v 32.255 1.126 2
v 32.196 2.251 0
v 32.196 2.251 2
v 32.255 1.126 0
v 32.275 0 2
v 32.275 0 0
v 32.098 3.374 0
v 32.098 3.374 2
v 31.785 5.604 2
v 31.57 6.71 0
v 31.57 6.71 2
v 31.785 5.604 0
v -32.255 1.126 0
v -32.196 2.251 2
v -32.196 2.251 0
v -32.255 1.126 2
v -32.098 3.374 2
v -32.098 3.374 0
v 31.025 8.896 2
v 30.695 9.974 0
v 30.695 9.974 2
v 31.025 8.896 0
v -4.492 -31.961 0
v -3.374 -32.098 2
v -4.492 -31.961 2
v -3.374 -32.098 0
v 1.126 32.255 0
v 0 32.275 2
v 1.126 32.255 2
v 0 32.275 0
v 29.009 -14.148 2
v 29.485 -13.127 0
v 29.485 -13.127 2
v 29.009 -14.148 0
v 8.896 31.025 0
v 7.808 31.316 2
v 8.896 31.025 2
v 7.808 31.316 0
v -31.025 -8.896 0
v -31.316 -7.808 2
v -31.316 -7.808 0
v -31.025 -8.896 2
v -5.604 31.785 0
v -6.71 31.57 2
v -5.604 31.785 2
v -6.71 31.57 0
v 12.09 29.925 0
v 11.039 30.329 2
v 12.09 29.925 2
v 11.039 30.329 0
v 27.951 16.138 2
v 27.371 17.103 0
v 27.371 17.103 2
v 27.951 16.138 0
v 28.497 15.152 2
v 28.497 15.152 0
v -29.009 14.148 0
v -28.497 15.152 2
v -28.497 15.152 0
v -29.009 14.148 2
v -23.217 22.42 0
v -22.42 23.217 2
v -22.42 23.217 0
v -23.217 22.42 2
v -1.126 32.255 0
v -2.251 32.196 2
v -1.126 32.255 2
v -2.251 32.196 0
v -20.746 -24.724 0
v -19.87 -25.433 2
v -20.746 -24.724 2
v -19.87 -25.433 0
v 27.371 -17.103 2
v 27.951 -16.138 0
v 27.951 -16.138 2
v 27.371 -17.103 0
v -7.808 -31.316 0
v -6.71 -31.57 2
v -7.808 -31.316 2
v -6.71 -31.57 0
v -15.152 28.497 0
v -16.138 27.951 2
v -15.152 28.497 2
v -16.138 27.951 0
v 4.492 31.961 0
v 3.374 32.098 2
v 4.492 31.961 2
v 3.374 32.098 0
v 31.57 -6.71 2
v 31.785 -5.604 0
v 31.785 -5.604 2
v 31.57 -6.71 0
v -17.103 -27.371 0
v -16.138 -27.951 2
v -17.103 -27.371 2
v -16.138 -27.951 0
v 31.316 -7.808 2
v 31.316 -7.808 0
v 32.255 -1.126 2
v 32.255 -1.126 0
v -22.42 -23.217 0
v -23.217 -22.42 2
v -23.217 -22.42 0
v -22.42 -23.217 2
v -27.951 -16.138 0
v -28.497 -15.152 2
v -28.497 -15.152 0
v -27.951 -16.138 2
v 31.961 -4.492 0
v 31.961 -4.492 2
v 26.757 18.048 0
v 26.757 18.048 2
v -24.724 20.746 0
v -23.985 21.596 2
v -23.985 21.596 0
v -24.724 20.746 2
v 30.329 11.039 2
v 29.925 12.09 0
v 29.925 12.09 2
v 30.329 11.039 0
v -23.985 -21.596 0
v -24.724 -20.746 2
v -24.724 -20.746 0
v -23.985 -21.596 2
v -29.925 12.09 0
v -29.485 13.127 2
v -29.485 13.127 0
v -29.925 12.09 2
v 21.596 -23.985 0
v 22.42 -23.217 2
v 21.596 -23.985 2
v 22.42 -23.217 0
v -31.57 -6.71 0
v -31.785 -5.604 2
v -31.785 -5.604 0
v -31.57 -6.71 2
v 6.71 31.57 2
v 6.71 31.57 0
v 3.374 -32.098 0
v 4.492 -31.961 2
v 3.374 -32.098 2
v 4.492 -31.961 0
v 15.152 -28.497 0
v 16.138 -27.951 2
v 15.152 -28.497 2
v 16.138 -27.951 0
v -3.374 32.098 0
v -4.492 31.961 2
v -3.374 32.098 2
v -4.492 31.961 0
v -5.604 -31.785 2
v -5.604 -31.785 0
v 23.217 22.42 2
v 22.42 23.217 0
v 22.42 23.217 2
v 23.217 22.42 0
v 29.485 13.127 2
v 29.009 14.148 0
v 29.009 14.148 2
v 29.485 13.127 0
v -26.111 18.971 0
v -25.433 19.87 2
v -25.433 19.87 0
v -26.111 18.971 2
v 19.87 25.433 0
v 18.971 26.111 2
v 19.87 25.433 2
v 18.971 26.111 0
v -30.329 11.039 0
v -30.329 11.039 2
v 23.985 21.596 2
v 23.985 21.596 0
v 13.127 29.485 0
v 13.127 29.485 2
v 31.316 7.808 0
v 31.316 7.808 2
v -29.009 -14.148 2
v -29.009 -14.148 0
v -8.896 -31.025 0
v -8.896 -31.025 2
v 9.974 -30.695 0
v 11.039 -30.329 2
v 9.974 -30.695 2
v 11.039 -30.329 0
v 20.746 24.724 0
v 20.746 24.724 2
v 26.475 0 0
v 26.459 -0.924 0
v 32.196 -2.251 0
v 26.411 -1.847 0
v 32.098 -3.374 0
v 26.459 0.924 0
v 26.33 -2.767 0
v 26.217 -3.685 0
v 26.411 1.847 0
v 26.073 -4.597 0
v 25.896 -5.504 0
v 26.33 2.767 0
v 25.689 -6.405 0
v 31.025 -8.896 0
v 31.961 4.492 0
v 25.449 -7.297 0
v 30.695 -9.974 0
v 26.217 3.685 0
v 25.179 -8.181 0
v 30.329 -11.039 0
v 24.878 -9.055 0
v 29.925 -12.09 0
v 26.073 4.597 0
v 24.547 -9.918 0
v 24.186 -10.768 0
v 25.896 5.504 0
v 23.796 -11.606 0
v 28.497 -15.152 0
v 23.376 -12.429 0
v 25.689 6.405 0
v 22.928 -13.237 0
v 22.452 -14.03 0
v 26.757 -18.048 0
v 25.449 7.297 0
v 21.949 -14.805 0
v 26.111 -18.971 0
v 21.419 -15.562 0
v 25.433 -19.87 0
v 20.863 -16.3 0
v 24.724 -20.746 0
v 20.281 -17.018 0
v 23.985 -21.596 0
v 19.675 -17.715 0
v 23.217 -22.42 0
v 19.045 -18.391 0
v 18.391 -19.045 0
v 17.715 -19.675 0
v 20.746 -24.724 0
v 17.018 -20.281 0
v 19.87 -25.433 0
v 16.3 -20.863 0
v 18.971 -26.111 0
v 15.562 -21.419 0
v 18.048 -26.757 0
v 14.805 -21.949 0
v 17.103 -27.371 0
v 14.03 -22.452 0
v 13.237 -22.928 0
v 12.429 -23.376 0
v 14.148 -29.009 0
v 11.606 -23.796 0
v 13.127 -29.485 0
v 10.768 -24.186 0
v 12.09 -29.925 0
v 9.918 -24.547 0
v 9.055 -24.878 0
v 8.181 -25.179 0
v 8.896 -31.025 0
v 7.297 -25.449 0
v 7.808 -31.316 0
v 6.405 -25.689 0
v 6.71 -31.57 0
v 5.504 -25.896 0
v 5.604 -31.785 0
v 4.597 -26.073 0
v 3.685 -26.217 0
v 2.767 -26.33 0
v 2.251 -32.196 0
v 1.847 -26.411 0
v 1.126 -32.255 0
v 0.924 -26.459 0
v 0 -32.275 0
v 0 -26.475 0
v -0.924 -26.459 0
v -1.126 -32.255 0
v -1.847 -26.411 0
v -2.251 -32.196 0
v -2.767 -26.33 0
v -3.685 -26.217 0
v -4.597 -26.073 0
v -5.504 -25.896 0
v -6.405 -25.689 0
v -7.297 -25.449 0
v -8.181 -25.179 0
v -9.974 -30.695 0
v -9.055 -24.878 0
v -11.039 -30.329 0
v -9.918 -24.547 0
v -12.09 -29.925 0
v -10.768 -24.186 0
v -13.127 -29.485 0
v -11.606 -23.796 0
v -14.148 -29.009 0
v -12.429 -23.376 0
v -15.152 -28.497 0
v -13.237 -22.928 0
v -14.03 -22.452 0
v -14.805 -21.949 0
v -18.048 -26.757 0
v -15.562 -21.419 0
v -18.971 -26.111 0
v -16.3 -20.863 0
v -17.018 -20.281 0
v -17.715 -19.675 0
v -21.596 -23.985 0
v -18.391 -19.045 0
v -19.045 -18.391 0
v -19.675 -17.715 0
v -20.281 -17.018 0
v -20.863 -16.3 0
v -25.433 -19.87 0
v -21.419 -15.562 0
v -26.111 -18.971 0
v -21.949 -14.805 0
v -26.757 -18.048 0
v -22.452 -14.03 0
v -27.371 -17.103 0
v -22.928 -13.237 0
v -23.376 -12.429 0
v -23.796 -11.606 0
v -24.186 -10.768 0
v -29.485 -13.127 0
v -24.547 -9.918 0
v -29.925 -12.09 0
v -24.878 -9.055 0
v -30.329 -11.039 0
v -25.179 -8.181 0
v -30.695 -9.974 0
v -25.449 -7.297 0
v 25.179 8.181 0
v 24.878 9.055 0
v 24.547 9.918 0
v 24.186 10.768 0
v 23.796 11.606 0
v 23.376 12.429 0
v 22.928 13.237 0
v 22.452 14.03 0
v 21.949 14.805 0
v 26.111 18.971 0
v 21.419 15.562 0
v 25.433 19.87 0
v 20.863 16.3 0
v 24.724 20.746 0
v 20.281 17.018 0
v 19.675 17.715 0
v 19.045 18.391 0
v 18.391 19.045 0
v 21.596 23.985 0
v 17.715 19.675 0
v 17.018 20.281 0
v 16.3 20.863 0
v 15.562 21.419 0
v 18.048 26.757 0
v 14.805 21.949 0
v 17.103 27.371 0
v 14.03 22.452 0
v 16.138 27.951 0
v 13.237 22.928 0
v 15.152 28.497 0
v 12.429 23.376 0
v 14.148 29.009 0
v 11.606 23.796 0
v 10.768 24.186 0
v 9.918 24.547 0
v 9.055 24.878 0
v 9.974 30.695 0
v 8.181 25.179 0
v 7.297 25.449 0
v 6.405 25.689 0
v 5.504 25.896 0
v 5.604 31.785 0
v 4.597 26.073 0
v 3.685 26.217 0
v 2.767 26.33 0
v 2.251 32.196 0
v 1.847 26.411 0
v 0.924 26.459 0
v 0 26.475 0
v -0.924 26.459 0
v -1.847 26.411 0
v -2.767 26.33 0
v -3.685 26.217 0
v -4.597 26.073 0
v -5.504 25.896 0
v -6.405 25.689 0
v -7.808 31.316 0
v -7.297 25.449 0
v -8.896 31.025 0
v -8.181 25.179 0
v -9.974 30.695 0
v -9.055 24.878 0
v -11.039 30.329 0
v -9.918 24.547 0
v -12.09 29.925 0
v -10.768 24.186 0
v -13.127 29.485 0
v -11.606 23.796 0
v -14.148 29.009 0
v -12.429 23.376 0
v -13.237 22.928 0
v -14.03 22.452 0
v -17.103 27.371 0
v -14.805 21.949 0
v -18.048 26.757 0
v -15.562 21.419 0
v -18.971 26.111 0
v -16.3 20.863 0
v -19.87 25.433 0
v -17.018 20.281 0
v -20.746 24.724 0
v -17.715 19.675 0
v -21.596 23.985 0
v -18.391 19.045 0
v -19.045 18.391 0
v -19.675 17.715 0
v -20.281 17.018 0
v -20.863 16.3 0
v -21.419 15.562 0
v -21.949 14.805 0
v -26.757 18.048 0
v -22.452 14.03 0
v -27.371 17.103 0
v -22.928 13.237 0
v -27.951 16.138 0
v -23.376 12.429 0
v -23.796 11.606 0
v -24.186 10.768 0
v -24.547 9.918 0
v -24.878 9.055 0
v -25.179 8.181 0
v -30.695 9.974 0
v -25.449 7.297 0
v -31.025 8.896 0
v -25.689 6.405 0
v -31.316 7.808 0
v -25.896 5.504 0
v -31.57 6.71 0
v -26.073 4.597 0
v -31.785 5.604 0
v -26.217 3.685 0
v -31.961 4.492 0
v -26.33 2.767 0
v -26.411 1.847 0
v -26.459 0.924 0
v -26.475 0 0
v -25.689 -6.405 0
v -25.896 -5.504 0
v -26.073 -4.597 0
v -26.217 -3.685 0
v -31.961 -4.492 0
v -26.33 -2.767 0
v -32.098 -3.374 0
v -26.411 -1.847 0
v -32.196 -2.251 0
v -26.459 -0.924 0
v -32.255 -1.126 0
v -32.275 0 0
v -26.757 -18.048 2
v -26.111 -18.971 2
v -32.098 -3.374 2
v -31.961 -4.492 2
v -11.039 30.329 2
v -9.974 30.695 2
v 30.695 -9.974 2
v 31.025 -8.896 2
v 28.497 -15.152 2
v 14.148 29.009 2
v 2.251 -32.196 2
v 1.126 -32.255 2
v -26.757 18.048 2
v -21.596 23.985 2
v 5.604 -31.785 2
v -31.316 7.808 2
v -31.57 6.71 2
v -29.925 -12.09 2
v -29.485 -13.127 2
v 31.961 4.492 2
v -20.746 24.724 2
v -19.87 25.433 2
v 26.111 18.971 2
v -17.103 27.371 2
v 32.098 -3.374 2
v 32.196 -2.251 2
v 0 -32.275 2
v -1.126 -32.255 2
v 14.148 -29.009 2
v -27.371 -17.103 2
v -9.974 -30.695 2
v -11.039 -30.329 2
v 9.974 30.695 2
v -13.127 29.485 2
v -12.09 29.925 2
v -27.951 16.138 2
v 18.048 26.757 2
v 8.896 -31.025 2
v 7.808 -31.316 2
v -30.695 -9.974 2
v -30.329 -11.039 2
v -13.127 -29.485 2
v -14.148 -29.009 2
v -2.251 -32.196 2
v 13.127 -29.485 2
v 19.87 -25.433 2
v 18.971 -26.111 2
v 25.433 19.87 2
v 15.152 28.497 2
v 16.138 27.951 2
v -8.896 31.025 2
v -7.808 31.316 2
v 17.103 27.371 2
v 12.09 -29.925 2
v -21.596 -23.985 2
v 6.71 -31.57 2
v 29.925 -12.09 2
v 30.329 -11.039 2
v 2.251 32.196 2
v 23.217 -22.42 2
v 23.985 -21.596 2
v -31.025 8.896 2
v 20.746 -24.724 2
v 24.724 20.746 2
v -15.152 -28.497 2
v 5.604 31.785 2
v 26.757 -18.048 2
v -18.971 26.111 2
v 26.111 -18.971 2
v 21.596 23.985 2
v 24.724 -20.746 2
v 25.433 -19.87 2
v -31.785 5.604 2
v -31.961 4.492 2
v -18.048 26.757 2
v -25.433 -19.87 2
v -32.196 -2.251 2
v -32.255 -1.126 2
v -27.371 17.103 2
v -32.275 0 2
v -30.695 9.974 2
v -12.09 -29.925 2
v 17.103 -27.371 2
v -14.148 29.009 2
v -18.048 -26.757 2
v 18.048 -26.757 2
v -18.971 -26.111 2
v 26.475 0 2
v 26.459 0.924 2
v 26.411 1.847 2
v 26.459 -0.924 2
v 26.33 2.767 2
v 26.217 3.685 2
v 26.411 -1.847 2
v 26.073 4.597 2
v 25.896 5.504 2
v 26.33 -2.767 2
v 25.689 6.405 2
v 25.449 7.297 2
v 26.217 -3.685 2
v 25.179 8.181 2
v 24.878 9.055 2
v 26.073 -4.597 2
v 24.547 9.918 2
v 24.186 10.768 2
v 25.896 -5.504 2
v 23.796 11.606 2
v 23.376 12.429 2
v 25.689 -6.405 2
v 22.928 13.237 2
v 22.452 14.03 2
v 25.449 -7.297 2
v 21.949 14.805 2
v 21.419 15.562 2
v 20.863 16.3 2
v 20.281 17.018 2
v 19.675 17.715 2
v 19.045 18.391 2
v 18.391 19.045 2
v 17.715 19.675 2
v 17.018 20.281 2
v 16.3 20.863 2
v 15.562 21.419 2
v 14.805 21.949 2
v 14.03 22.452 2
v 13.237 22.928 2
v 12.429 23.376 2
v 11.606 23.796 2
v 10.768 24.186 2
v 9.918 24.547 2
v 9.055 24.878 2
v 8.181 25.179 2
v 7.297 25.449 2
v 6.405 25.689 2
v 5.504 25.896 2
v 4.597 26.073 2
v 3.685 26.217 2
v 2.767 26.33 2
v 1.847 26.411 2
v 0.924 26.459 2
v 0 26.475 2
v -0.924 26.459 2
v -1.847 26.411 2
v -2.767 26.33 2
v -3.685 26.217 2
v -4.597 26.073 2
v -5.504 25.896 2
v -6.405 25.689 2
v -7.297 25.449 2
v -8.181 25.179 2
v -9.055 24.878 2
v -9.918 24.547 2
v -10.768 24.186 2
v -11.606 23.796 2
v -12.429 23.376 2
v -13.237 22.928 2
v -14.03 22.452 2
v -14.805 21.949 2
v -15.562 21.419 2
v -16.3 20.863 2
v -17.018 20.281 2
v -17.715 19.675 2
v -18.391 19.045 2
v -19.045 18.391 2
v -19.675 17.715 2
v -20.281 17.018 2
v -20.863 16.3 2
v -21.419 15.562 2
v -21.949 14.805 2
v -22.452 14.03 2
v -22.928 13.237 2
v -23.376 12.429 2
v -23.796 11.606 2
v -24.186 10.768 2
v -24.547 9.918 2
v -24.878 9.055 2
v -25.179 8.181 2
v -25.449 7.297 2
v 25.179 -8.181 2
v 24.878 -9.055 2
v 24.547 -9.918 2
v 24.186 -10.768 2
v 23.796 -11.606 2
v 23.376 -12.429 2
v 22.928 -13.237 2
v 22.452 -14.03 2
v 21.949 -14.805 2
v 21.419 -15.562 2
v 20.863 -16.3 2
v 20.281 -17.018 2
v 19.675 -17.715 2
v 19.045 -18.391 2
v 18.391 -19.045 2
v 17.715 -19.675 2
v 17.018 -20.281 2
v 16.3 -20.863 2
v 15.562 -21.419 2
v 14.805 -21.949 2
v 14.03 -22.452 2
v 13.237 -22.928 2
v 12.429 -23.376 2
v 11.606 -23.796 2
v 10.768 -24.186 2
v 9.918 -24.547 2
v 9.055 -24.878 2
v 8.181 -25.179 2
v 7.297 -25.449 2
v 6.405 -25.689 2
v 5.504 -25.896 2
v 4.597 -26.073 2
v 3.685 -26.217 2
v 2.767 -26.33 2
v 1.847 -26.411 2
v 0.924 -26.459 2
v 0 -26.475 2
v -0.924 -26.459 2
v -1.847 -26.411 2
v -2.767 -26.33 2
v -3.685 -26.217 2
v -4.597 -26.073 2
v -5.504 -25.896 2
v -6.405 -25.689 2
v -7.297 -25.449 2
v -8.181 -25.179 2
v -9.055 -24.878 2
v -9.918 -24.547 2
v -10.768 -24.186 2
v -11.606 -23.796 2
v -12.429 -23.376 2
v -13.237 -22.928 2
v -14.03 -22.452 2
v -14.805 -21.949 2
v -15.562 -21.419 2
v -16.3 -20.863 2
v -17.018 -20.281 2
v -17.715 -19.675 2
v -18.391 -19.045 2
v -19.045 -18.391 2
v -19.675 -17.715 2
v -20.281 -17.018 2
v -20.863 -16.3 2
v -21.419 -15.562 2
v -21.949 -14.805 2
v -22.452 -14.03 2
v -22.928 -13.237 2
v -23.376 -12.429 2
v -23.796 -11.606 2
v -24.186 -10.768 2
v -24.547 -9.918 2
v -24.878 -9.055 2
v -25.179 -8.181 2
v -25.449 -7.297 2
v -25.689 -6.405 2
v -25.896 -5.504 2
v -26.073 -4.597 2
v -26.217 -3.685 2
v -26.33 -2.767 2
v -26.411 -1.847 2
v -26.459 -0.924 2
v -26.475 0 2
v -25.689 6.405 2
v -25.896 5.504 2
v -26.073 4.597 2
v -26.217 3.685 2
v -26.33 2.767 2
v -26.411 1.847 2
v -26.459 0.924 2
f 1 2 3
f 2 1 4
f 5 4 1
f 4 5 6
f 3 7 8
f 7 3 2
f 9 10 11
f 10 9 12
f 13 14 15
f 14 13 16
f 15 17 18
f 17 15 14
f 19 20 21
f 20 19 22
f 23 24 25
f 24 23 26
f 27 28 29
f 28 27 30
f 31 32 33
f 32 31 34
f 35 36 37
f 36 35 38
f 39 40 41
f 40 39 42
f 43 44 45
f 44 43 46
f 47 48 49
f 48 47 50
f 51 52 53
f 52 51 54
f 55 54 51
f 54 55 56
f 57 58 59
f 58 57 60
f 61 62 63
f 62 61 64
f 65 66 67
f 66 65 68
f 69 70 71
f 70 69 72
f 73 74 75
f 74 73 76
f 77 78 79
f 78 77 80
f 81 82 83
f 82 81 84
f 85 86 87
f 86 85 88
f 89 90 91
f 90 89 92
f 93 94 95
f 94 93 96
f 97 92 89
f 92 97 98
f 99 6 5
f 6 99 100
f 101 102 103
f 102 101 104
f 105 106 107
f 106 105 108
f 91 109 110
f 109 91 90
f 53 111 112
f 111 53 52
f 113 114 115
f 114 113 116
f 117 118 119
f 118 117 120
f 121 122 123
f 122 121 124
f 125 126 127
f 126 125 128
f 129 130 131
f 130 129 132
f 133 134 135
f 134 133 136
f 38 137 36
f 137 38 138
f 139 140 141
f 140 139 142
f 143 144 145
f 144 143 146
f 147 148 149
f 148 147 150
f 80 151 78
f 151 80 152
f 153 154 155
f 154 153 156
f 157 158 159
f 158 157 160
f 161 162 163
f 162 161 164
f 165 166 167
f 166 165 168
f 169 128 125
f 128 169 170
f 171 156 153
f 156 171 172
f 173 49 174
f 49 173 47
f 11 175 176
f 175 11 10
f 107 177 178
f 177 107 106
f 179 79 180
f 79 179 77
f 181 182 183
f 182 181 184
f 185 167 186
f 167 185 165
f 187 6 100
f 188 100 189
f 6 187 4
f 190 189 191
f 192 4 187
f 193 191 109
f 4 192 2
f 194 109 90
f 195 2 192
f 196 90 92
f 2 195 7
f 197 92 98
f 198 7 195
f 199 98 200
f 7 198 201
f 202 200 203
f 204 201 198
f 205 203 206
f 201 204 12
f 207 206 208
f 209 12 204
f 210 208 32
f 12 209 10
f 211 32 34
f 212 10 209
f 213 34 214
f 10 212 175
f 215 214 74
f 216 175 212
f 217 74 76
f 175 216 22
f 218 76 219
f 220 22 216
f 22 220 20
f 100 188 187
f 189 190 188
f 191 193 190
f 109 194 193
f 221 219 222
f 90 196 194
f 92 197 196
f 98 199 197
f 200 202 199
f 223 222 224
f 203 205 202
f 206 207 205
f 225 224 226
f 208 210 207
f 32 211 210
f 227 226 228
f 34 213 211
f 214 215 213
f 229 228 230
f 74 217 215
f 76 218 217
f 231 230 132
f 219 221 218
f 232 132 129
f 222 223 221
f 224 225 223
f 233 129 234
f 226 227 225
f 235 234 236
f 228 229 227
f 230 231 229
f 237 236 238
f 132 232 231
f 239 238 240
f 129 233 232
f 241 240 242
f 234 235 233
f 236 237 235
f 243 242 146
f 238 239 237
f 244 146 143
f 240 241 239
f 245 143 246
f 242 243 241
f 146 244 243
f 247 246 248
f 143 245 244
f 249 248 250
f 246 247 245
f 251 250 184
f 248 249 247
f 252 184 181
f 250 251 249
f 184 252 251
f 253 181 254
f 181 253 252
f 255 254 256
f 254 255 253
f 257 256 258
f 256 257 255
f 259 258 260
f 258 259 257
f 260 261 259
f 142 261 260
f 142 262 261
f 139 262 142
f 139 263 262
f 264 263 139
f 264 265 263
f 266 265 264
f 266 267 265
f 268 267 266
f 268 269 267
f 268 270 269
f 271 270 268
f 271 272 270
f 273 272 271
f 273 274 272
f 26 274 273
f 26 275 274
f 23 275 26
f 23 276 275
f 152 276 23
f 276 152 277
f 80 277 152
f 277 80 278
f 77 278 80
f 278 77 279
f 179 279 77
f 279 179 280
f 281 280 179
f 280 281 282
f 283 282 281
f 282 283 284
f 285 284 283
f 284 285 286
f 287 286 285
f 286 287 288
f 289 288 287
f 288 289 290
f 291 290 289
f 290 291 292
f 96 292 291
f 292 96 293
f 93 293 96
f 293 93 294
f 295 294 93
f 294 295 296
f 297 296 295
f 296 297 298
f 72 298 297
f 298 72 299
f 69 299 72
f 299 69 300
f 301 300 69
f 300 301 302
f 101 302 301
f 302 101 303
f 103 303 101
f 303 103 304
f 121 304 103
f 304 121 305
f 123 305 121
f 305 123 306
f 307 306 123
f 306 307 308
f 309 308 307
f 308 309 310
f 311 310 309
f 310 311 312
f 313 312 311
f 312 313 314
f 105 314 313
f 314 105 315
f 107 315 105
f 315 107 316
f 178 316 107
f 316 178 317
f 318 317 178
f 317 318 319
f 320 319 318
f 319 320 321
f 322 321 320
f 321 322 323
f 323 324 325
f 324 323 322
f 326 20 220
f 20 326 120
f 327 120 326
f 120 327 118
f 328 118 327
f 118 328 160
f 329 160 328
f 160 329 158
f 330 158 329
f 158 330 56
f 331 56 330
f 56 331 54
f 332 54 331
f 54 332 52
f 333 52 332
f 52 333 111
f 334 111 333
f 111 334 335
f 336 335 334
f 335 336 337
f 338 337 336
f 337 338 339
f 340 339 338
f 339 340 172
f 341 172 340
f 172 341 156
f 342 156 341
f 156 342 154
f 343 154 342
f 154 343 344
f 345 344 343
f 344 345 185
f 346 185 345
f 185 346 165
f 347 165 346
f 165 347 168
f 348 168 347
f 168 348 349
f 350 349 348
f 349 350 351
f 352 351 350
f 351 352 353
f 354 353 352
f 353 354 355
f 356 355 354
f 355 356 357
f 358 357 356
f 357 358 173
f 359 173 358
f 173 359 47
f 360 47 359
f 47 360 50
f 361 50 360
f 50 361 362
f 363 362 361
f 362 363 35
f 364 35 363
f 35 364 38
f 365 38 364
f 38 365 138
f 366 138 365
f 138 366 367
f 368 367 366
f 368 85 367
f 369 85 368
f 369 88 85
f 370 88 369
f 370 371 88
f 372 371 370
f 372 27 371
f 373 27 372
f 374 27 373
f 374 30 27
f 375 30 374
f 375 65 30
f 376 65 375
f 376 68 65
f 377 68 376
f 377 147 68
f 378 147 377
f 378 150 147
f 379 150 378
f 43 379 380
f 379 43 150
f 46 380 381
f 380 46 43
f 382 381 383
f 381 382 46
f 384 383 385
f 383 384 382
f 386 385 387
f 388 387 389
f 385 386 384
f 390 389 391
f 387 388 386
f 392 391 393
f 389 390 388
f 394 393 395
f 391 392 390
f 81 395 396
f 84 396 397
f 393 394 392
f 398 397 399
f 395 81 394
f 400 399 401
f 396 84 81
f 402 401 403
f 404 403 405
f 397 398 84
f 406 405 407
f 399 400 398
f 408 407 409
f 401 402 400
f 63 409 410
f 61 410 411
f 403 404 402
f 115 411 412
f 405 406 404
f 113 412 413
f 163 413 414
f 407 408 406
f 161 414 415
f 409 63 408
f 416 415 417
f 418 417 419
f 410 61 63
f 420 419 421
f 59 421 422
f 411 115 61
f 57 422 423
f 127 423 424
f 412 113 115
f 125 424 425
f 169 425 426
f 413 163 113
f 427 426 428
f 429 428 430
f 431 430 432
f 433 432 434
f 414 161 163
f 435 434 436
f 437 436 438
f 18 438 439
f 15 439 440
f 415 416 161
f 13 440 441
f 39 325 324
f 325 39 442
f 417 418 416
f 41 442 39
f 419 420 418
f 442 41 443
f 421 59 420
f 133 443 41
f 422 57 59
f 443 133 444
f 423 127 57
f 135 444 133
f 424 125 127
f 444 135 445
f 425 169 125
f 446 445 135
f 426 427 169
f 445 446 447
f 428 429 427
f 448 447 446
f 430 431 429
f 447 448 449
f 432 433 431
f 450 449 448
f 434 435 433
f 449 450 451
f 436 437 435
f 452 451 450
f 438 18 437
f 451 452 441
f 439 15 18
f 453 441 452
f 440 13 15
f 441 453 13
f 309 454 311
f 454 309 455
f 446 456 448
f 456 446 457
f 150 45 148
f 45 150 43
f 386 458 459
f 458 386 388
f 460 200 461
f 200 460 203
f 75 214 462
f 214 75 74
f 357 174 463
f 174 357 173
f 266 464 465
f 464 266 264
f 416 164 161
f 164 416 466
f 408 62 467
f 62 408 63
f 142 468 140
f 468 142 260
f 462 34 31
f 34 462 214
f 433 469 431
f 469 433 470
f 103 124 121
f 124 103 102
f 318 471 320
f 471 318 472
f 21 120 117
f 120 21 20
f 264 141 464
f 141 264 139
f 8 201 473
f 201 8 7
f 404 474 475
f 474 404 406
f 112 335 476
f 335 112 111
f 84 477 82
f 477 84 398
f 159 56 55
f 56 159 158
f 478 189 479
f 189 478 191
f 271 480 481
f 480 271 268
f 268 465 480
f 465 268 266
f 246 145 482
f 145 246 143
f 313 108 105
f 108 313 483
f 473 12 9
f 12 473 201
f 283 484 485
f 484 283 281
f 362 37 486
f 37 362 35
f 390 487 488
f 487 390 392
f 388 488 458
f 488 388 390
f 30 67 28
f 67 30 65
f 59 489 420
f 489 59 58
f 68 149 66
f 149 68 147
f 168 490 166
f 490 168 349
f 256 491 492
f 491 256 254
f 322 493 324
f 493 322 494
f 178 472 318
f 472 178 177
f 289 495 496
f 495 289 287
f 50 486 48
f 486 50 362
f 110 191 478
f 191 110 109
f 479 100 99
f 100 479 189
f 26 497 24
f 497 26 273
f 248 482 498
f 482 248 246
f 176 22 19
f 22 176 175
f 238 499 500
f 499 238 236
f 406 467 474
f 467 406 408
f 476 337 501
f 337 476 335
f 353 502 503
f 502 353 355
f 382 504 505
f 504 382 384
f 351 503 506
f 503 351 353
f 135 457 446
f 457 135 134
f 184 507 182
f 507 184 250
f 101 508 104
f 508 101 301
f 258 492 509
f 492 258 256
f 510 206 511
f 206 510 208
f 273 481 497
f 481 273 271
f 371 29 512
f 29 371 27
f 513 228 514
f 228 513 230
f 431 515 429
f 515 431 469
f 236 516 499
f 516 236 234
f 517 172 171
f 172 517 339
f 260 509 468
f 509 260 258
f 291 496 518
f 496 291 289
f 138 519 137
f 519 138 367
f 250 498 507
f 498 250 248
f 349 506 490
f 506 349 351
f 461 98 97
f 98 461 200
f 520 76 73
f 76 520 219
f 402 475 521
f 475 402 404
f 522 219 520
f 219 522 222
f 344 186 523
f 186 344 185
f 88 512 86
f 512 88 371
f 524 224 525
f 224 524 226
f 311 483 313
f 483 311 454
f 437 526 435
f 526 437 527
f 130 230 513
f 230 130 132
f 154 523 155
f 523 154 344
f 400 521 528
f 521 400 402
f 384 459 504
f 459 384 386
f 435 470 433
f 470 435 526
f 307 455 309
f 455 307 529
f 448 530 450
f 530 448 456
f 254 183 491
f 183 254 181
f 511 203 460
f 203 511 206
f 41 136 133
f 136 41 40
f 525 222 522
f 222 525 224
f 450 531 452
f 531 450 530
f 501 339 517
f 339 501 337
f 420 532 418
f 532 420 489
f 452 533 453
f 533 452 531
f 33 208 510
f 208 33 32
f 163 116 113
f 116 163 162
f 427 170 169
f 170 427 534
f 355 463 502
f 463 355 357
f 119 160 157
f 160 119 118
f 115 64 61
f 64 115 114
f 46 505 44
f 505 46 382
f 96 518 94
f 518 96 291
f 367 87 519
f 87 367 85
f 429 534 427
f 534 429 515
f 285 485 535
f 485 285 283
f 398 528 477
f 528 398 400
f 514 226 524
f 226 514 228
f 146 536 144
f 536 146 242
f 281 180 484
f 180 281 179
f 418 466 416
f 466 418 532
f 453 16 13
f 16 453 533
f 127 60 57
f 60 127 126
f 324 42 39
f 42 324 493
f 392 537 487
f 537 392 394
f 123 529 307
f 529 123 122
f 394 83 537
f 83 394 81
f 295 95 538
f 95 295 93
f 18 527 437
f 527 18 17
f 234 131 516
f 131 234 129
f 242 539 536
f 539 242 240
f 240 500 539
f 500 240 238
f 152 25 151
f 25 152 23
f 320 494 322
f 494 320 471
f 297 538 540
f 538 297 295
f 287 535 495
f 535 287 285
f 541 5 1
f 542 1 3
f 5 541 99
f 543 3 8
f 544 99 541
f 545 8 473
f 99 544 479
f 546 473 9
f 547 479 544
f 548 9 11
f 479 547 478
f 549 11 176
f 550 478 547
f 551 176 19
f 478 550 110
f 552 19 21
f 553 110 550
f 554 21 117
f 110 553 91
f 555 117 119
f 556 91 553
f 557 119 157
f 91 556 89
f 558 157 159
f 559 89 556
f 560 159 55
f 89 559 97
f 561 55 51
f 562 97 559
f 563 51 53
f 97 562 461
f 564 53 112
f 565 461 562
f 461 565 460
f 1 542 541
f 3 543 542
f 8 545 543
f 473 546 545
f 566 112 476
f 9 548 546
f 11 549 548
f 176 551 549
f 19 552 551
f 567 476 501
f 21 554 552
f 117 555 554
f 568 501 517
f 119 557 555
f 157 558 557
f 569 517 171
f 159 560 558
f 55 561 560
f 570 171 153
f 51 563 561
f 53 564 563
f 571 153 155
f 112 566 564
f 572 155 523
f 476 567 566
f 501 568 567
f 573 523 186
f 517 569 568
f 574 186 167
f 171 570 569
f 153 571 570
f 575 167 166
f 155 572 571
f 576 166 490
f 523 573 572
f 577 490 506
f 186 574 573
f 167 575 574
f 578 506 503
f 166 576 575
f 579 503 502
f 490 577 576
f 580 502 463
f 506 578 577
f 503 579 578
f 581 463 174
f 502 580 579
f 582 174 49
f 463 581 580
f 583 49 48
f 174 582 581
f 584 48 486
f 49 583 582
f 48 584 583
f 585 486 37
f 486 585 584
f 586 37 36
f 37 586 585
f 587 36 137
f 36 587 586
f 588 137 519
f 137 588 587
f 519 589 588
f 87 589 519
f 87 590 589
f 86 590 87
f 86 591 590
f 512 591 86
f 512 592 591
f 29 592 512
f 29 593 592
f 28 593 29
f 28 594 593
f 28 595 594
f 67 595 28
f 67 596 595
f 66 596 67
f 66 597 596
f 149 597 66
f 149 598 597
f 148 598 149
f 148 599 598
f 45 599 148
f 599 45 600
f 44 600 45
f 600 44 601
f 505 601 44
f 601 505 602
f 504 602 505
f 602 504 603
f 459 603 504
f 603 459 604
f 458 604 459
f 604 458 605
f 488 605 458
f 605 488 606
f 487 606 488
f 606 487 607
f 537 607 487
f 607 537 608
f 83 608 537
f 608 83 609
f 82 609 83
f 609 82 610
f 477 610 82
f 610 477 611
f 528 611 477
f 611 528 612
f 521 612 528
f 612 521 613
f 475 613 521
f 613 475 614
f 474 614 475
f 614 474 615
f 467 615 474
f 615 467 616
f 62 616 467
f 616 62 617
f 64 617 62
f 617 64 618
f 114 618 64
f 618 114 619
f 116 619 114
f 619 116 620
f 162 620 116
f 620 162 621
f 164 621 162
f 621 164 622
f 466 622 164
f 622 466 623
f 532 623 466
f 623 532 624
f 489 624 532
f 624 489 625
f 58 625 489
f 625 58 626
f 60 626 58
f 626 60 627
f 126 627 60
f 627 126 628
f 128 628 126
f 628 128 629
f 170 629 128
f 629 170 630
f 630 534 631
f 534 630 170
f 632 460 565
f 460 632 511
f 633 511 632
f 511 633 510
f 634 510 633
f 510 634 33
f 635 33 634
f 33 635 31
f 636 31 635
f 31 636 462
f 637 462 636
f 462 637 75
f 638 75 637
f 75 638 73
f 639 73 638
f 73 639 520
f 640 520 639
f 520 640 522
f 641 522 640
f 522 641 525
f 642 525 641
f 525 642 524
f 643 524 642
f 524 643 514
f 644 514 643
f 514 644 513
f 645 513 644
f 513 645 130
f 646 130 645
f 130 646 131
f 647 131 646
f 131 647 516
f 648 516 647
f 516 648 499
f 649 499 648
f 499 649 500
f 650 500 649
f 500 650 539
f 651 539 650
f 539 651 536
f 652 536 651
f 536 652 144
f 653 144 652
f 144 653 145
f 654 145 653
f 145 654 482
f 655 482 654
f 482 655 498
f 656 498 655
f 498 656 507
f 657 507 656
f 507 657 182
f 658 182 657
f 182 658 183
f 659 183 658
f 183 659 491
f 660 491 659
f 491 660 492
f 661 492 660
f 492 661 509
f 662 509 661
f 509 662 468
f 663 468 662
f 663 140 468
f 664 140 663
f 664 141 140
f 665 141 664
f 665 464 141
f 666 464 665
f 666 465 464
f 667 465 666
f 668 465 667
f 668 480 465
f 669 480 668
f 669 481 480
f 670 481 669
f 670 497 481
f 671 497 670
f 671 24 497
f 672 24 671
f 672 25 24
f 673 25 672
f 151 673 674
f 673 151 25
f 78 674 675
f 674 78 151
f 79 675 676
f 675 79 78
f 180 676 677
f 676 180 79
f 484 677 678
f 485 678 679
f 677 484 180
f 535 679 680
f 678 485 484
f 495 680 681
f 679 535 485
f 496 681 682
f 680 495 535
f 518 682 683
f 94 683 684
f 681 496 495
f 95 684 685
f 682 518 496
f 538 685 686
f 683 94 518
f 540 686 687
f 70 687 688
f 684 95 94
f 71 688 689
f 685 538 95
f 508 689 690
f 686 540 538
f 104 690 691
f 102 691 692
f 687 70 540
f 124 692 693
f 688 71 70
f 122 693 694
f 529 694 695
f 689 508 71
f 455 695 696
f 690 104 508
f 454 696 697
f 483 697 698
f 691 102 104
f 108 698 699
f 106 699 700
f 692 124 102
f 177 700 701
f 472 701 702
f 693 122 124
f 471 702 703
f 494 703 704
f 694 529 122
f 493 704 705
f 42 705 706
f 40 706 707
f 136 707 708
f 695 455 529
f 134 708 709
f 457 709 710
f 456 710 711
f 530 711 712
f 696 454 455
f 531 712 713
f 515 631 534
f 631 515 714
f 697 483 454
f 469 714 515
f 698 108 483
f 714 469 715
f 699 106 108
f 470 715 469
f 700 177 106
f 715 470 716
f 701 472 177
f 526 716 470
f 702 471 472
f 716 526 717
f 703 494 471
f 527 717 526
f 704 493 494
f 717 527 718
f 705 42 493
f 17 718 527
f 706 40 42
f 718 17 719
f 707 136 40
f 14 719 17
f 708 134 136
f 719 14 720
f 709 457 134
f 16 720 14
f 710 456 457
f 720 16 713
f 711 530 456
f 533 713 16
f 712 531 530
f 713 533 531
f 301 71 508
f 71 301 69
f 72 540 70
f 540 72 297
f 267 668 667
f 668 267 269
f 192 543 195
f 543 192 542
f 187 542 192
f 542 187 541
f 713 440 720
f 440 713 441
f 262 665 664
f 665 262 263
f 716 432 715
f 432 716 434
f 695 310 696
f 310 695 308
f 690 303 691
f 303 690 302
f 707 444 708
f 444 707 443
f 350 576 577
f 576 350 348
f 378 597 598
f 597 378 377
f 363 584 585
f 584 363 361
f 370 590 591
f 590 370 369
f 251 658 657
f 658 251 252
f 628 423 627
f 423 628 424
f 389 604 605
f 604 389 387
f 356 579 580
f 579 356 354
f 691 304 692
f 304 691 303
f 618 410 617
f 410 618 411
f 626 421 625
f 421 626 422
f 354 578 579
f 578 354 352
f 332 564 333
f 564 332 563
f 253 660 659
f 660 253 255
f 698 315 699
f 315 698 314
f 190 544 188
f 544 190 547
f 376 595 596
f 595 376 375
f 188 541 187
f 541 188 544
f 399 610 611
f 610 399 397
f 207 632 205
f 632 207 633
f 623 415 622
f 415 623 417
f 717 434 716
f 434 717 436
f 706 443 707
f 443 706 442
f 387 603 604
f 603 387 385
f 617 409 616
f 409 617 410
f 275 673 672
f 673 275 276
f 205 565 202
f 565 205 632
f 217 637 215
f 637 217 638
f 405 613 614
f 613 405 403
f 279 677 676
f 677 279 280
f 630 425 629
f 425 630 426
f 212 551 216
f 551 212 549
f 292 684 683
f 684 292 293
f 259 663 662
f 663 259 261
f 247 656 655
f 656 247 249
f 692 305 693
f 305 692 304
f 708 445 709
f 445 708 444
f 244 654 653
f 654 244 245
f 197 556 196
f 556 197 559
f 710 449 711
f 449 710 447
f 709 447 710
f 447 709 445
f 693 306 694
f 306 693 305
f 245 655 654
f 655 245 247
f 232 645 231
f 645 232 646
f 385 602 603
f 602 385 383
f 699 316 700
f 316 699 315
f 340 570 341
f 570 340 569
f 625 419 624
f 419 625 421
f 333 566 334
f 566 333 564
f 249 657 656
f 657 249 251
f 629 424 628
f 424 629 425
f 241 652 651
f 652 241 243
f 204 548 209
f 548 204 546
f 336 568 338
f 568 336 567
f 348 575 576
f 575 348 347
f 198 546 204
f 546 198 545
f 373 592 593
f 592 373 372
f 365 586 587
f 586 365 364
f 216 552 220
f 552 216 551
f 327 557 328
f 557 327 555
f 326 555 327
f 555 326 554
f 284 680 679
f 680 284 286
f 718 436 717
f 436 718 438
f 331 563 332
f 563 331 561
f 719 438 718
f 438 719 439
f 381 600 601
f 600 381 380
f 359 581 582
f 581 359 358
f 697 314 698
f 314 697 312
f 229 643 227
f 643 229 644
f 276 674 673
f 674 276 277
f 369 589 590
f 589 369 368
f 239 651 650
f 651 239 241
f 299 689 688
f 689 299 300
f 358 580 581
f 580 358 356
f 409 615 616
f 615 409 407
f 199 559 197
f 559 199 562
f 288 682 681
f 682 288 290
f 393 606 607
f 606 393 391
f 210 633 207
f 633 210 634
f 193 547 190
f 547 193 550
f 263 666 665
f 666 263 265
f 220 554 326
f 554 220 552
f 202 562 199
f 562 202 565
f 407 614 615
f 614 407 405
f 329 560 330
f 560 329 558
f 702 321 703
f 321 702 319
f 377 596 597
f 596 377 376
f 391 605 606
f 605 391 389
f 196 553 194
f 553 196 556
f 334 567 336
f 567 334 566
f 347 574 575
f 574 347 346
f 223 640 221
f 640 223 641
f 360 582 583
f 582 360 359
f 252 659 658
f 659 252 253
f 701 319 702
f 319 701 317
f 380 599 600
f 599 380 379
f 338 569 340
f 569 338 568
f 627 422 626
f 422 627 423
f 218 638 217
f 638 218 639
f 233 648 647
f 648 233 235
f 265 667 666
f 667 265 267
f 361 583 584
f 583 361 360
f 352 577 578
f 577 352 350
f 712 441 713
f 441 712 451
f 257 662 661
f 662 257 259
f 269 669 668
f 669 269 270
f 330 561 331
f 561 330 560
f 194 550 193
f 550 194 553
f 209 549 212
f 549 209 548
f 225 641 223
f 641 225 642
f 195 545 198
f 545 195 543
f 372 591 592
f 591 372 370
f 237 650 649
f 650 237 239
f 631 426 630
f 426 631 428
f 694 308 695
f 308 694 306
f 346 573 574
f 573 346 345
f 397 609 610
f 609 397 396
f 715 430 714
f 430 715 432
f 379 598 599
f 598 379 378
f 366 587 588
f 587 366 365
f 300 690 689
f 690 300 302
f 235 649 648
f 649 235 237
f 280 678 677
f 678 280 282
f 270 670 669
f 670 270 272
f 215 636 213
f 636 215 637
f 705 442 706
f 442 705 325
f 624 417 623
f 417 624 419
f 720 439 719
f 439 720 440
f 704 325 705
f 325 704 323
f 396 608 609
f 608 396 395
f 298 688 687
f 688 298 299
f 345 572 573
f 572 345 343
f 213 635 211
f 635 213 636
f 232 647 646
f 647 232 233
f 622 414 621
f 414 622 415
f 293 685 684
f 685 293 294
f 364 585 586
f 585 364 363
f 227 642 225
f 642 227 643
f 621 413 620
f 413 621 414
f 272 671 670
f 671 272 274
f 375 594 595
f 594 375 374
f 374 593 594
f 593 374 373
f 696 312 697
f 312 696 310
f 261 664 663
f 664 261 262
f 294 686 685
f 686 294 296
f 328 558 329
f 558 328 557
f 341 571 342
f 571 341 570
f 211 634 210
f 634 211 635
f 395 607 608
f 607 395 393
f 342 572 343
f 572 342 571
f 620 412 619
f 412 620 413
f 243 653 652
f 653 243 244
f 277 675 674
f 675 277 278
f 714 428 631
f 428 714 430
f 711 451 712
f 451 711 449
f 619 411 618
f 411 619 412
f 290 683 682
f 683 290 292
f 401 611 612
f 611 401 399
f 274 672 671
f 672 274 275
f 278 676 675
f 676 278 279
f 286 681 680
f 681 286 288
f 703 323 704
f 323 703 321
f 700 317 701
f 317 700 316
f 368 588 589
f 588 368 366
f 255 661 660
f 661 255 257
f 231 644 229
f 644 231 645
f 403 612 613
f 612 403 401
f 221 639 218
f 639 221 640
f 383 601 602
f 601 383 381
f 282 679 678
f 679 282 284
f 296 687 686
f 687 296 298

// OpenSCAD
// Diffuser for the face's LED ring: a flat ring pressed into the face from the front, flush
// with the surface. Print flat on the bed (no supports) in white or natural (translucent)
// PLA/PETG. Thinner = brighter, thicker = smoother: with the 3.5 mm air gap behind it, 2 mm of
// natural PETG or 1.5-2 mm of white PLA blends the 24 LEDs into one glow.
include <../../params.scad>

ring_r = (ring_od + ring_id) / 4;              // radius of the LED centres

difference() {
    cylinder(r = ring_r + diff_w / 2 - diff_clr[1], h = diff_t, $fn = 180);
    translate([0, 0, -1]) cylinder(r = ring_r - diff_w / 2 + diff_clr[0], h = diff_t + 2, $fn = 180);
}
